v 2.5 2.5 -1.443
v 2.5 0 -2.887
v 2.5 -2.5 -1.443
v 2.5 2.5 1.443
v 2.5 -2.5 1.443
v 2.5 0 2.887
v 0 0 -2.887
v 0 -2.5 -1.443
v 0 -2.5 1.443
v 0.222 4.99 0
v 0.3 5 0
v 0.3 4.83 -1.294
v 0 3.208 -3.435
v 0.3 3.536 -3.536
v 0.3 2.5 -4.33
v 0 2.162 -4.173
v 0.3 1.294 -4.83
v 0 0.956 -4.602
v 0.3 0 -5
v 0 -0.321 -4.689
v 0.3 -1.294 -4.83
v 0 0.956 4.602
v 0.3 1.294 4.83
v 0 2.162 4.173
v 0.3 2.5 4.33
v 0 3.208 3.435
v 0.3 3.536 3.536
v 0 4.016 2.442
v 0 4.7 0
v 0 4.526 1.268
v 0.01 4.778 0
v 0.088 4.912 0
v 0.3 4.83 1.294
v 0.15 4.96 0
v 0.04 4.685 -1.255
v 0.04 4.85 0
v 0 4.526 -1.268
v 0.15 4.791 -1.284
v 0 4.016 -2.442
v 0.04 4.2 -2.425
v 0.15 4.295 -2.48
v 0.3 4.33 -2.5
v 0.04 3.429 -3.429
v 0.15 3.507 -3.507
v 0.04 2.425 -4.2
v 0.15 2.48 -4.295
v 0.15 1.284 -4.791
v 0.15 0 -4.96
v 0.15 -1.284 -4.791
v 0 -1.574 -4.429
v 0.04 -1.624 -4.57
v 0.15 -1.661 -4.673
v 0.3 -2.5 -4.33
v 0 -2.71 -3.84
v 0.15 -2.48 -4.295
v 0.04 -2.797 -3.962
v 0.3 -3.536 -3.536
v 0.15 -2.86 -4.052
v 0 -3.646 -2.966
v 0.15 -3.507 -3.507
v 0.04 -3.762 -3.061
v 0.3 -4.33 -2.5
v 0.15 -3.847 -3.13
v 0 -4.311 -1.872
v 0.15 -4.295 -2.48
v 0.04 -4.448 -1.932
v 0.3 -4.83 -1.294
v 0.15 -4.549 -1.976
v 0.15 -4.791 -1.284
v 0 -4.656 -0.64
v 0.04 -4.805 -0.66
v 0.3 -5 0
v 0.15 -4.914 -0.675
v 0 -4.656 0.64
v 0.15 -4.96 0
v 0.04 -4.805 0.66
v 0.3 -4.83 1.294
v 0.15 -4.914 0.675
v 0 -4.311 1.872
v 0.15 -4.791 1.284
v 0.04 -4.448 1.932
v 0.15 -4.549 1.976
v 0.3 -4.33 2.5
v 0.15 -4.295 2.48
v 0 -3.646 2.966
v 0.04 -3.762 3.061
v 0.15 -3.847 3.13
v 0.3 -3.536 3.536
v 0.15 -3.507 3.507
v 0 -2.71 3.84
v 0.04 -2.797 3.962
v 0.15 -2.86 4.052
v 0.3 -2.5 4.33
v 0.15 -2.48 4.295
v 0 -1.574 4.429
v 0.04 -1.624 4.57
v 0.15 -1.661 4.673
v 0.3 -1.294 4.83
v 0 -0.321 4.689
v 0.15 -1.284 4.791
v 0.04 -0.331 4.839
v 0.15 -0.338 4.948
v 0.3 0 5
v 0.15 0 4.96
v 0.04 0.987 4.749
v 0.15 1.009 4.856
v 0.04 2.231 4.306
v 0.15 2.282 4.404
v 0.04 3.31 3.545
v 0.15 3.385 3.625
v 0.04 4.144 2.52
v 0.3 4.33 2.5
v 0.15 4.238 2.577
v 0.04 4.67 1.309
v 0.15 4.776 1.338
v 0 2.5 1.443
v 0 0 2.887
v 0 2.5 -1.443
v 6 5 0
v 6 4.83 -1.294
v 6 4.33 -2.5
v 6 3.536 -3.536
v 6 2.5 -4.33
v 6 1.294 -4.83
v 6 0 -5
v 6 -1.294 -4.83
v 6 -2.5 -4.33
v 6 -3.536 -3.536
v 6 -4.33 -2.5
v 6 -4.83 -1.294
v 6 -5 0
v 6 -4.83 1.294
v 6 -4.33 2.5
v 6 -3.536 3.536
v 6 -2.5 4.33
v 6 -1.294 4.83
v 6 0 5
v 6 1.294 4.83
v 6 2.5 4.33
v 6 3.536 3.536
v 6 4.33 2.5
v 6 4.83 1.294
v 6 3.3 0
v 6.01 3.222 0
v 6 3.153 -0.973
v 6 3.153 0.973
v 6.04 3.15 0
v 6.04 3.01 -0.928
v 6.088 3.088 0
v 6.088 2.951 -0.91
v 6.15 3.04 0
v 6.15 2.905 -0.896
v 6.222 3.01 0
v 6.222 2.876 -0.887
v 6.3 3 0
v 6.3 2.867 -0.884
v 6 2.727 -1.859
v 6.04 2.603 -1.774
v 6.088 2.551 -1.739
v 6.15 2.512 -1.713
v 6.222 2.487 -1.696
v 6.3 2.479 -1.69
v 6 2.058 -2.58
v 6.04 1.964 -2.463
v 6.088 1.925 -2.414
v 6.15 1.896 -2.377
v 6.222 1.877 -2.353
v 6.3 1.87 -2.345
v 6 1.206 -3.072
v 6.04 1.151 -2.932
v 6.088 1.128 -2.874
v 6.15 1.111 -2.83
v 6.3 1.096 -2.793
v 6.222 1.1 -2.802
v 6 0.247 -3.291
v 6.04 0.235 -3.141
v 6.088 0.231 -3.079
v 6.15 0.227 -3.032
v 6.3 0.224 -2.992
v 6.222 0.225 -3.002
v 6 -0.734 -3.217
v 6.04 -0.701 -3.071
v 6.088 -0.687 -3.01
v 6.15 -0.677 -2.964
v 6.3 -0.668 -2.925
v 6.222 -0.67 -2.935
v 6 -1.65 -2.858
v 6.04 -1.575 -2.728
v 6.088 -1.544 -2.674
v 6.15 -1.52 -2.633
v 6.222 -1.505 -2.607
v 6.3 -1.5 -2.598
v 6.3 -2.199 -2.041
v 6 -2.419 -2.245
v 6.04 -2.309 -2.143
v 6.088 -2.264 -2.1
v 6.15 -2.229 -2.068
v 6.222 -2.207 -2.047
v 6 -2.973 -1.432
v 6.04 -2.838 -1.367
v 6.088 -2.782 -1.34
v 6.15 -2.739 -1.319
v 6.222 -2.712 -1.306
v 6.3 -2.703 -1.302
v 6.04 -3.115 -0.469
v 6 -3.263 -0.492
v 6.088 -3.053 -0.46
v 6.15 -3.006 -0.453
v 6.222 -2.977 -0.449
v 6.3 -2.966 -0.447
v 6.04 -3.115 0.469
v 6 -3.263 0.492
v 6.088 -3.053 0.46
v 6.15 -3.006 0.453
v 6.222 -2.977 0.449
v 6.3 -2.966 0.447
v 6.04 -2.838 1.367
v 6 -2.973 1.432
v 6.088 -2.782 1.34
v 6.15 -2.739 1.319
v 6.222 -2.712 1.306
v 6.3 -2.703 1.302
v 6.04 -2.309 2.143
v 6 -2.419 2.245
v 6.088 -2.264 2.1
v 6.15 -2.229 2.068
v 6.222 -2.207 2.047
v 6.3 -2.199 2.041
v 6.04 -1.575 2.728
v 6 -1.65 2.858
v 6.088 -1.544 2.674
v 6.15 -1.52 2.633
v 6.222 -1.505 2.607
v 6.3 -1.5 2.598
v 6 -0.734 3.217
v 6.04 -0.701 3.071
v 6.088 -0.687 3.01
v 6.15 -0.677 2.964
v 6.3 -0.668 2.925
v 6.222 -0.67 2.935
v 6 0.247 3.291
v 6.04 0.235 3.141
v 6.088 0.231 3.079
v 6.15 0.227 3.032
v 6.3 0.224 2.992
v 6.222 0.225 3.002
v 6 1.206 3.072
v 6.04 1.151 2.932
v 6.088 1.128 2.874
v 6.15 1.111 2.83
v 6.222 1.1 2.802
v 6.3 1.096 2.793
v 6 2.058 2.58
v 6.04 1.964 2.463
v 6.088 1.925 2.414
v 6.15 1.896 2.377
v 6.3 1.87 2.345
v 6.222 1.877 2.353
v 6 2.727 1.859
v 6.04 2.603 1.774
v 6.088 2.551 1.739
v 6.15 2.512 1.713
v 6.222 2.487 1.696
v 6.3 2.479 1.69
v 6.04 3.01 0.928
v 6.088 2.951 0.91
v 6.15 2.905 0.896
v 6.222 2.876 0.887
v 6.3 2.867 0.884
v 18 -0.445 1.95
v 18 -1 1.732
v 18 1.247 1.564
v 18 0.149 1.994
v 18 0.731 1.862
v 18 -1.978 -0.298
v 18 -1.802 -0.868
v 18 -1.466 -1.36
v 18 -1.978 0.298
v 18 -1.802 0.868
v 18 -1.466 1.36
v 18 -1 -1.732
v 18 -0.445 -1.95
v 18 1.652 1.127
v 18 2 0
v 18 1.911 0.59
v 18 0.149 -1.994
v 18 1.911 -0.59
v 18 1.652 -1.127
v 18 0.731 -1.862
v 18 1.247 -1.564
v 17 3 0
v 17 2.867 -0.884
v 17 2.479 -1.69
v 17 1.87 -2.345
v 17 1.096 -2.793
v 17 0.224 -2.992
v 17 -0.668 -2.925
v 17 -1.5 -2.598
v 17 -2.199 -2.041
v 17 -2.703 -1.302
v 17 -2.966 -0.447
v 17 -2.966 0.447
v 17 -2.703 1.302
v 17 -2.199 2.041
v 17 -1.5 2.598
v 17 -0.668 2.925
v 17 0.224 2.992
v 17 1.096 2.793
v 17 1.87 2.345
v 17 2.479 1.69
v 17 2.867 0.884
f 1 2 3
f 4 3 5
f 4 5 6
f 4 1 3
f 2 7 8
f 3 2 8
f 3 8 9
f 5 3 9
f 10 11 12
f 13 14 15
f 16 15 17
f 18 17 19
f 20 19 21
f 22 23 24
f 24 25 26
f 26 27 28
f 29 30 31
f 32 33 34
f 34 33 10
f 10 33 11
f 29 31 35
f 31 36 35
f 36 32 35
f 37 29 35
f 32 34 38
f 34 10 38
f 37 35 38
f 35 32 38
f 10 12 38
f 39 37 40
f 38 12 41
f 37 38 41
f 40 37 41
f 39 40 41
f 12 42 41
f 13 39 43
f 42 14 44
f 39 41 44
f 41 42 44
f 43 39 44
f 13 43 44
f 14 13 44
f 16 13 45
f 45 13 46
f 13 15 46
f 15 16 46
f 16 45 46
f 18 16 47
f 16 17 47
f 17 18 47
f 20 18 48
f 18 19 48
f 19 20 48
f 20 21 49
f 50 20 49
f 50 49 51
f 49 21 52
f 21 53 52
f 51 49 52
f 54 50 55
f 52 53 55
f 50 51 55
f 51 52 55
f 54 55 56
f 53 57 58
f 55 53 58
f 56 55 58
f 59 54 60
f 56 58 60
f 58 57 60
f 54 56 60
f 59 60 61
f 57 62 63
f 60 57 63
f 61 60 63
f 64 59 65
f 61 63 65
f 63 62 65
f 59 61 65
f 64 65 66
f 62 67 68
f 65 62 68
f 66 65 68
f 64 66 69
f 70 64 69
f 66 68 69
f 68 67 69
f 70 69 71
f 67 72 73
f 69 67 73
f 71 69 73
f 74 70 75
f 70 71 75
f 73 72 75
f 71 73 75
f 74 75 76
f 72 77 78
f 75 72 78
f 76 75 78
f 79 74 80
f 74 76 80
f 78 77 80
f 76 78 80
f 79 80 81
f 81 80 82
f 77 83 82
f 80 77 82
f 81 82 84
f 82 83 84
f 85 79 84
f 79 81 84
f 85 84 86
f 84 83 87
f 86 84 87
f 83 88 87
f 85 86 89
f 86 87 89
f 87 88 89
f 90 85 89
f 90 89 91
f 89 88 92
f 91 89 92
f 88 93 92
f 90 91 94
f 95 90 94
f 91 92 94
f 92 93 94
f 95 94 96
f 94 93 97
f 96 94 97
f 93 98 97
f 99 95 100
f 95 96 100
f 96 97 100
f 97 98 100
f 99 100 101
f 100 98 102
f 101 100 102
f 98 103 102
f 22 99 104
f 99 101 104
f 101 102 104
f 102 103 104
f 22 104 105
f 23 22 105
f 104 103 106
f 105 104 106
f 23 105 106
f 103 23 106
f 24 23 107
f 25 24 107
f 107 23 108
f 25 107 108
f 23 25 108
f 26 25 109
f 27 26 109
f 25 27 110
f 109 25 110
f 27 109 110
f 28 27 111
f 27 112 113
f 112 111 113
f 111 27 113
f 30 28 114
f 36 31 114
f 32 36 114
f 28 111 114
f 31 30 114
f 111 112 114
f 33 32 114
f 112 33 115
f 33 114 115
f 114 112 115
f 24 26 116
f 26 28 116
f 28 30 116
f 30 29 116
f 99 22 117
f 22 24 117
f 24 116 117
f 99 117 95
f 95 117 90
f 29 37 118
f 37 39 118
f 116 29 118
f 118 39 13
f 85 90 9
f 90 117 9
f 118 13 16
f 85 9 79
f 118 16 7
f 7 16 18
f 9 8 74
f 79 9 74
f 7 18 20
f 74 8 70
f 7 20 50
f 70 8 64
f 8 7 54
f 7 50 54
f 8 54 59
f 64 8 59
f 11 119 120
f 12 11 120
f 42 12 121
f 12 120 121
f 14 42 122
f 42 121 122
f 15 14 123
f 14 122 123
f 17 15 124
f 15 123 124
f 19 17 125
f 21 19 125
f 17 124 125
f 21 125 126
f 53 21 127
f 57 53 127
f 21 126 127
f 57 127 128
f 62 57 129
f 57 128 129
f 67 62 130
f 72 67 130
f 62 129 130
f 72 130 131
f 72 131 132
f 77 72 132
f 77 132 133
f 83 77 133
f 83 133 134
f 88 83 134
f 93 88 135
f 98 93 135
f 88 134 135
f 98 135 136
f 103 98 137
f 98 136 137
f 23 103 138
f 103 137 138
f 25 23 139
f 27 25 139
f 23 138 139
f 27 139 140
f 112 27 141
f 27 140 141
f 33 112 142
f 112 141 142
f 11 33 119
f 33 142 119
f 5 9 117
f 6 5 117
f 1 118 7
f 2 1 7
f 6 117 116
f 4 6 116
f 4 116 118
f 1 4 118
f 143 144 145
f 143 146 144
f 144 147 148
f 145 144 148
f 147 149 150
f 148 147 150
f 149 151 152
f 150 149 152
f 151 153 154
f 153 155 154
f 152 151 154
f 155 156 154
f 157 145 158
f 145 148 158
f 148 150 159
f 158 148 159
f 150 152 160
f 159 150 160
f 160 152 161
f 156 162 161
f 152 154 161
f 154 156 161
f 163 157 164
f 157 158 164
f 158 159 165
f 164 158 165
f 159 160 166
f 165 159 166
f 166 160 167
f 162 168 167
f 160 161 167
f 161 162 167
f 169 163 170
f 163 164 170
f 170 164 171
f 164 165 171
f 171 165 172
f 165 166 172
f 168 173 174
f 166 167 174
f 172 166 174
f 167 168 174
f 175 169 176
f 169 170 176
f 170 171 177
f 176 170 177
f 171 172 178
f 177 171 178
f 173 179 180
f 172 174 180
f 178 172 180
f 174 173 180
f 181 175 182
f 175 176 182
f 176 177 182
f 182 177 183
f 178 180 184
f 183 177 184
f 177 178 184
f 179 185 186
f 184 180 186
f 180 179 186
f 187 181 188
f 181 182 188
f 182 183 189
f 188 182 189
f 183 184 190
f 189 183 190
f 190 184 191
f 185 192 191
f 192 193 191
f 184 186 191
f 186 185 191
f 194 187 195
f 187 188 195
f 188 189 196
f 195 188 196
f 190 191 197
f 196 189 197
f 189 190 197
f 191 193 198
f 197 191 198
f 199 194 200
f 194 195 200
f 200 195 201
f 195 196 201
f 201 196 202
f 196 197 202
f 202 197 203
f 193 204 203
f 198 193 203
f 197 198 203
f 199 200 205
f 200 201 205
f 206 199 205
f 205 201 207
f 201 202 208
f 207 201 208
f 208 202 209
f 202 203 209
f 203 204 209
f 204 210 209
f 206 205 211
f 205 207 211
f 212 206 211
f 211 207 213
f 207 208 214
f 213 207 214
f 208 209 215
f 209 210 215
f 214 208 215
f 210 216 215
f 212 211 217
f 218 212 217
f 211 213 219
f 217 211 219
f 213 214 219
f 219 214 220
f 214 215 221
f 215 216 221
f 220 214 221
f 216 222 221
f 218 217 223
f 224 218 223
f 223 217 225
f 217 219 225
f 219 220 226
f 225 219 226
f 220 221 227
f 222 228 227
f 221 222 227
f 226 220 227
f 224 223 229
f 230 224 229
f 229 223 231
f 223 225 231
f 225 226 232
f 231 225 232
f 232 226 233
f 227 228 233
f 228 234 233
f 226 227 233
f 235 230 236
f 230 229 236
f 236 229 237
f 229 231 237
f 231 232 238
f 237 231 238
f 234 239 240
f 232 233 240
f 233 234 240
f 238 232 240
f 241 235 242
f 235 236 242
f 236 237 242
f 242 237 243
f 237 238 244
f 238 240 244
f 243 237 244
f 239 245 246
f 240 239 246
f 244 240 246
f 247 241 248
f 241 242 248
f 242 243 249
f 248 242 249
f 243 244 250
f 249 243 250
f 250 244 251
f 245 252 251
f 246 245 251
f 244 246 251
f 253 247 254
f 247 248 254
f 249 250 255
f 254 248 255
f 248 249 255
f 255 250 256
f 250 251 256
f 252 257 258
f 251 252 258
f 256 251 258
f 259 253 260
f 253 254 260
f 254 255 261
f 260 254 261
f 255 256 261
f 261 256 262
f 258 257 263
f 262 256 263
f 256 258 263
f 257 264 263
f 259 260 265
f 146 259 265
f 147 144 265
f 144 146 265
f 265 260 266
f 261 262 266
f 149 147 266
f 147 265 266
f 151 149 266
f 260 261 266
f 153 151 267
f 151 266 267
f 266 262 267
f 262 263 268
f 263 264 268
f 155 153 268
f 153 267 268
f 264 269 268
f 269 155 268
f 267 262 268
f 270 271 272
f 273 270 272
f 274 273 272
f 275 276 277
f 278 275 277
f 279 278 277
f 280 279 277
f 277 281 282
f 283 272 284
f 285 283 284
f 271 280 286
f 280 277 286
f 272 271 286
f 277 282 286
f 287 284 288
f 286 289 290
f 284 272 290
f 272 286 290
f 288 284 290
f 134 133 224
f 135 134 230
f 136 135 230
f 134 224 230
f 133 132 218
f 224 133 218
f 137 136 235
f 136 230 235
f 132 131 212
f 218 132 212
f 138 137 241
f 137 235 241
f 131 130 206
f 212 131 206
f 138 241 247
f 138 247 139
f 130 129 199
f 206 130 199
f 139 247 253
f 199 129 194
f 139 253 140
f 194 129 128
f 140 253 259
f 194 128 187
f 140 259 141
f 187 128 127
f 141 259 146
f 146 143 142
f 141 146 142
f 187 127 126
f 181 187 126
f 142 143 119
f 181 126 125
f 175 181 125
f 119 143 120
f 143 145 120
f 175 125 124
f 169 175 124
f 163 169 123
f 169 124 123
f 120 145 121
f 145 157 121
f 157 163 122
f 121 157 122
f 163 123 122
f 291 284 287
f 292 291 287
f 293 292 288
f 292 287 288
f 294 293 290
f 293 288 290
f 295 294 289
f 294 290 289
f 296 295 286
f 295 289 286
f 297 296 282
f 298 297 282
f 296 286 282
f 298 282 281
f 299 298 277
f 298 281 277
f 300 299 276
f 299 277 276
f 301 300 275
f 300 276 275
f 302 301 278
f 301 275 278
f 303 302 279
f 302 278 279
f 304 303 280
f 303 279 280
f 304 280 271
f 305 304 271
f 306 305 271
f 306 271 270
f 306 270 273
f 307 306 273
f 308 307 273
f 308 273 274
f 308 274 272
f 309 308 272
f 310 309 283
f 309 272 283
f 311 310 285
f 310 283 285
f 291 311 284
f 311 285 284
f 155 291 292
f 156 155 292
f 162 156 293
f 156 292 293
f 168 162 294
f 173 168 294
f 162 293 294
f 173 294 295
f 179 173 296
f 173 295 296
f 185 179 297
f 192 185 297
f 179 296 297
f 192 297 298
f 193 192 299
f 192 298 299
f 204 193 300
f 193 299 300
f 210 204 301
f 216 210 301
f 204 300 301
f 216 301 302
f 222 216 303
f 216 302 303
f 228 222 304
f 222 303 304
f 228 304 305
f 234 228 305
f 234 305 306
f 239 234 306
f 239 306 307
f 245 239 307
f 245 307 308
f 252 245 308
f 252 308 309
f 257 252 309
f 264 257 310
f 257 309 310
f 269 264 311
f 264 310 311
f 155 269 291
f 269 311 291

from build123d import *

# Parameters (mm, degrees)
CUT_EXTRUDE_1_DEPTH = 2.5
FILLET_1_R          = 0.3
CHAMFER_1_SIZE      = 1


with BuildPart() as part:
    # Эскиз1 → Повернуть1 (revolve)
    with BuildSketch(Plane.XY):
        Polygon((0, 0), (0, 5), (6, 5), (6, 3), (18, 3), (18, 0), align=None)
    revolve(axis=Axis((18, 0, 0), (-1, 0, 0)))

    # Эскиз2 → Вырез-Вытянуть1 (cut)
    with BuildSketch(Plane.ZY):
        Polygon((-1.443375673, 2.5), (-2.886751346, 0), (-1.443375673, -2.5), (1.443375673, -2.5), (2.886751346, 0), (1.443375673, 2.5), align=None)
    extrude(amount=-CUT_EXTRUDE_1_DEPTH, mode=Mode.SUBTRACT)

    # Скругление1
    fillet_1_edges = [part.edges().sort_by_distance(p)[0] for p in [
        (6, -3, 0),
        (0, -5, 0),
    ]]
    fillet(fillet_1_edges, radius=FILLET_1_R)

    # Фаска1
    chamfer_1_edges = [part.edges().sort_by_distance(p)[0] for p in [
        (18, -3, 0),
    ]]
    chamfer(chamfer_1_edges, length=CHAMFER_1_SIZE)


solid = part.part
